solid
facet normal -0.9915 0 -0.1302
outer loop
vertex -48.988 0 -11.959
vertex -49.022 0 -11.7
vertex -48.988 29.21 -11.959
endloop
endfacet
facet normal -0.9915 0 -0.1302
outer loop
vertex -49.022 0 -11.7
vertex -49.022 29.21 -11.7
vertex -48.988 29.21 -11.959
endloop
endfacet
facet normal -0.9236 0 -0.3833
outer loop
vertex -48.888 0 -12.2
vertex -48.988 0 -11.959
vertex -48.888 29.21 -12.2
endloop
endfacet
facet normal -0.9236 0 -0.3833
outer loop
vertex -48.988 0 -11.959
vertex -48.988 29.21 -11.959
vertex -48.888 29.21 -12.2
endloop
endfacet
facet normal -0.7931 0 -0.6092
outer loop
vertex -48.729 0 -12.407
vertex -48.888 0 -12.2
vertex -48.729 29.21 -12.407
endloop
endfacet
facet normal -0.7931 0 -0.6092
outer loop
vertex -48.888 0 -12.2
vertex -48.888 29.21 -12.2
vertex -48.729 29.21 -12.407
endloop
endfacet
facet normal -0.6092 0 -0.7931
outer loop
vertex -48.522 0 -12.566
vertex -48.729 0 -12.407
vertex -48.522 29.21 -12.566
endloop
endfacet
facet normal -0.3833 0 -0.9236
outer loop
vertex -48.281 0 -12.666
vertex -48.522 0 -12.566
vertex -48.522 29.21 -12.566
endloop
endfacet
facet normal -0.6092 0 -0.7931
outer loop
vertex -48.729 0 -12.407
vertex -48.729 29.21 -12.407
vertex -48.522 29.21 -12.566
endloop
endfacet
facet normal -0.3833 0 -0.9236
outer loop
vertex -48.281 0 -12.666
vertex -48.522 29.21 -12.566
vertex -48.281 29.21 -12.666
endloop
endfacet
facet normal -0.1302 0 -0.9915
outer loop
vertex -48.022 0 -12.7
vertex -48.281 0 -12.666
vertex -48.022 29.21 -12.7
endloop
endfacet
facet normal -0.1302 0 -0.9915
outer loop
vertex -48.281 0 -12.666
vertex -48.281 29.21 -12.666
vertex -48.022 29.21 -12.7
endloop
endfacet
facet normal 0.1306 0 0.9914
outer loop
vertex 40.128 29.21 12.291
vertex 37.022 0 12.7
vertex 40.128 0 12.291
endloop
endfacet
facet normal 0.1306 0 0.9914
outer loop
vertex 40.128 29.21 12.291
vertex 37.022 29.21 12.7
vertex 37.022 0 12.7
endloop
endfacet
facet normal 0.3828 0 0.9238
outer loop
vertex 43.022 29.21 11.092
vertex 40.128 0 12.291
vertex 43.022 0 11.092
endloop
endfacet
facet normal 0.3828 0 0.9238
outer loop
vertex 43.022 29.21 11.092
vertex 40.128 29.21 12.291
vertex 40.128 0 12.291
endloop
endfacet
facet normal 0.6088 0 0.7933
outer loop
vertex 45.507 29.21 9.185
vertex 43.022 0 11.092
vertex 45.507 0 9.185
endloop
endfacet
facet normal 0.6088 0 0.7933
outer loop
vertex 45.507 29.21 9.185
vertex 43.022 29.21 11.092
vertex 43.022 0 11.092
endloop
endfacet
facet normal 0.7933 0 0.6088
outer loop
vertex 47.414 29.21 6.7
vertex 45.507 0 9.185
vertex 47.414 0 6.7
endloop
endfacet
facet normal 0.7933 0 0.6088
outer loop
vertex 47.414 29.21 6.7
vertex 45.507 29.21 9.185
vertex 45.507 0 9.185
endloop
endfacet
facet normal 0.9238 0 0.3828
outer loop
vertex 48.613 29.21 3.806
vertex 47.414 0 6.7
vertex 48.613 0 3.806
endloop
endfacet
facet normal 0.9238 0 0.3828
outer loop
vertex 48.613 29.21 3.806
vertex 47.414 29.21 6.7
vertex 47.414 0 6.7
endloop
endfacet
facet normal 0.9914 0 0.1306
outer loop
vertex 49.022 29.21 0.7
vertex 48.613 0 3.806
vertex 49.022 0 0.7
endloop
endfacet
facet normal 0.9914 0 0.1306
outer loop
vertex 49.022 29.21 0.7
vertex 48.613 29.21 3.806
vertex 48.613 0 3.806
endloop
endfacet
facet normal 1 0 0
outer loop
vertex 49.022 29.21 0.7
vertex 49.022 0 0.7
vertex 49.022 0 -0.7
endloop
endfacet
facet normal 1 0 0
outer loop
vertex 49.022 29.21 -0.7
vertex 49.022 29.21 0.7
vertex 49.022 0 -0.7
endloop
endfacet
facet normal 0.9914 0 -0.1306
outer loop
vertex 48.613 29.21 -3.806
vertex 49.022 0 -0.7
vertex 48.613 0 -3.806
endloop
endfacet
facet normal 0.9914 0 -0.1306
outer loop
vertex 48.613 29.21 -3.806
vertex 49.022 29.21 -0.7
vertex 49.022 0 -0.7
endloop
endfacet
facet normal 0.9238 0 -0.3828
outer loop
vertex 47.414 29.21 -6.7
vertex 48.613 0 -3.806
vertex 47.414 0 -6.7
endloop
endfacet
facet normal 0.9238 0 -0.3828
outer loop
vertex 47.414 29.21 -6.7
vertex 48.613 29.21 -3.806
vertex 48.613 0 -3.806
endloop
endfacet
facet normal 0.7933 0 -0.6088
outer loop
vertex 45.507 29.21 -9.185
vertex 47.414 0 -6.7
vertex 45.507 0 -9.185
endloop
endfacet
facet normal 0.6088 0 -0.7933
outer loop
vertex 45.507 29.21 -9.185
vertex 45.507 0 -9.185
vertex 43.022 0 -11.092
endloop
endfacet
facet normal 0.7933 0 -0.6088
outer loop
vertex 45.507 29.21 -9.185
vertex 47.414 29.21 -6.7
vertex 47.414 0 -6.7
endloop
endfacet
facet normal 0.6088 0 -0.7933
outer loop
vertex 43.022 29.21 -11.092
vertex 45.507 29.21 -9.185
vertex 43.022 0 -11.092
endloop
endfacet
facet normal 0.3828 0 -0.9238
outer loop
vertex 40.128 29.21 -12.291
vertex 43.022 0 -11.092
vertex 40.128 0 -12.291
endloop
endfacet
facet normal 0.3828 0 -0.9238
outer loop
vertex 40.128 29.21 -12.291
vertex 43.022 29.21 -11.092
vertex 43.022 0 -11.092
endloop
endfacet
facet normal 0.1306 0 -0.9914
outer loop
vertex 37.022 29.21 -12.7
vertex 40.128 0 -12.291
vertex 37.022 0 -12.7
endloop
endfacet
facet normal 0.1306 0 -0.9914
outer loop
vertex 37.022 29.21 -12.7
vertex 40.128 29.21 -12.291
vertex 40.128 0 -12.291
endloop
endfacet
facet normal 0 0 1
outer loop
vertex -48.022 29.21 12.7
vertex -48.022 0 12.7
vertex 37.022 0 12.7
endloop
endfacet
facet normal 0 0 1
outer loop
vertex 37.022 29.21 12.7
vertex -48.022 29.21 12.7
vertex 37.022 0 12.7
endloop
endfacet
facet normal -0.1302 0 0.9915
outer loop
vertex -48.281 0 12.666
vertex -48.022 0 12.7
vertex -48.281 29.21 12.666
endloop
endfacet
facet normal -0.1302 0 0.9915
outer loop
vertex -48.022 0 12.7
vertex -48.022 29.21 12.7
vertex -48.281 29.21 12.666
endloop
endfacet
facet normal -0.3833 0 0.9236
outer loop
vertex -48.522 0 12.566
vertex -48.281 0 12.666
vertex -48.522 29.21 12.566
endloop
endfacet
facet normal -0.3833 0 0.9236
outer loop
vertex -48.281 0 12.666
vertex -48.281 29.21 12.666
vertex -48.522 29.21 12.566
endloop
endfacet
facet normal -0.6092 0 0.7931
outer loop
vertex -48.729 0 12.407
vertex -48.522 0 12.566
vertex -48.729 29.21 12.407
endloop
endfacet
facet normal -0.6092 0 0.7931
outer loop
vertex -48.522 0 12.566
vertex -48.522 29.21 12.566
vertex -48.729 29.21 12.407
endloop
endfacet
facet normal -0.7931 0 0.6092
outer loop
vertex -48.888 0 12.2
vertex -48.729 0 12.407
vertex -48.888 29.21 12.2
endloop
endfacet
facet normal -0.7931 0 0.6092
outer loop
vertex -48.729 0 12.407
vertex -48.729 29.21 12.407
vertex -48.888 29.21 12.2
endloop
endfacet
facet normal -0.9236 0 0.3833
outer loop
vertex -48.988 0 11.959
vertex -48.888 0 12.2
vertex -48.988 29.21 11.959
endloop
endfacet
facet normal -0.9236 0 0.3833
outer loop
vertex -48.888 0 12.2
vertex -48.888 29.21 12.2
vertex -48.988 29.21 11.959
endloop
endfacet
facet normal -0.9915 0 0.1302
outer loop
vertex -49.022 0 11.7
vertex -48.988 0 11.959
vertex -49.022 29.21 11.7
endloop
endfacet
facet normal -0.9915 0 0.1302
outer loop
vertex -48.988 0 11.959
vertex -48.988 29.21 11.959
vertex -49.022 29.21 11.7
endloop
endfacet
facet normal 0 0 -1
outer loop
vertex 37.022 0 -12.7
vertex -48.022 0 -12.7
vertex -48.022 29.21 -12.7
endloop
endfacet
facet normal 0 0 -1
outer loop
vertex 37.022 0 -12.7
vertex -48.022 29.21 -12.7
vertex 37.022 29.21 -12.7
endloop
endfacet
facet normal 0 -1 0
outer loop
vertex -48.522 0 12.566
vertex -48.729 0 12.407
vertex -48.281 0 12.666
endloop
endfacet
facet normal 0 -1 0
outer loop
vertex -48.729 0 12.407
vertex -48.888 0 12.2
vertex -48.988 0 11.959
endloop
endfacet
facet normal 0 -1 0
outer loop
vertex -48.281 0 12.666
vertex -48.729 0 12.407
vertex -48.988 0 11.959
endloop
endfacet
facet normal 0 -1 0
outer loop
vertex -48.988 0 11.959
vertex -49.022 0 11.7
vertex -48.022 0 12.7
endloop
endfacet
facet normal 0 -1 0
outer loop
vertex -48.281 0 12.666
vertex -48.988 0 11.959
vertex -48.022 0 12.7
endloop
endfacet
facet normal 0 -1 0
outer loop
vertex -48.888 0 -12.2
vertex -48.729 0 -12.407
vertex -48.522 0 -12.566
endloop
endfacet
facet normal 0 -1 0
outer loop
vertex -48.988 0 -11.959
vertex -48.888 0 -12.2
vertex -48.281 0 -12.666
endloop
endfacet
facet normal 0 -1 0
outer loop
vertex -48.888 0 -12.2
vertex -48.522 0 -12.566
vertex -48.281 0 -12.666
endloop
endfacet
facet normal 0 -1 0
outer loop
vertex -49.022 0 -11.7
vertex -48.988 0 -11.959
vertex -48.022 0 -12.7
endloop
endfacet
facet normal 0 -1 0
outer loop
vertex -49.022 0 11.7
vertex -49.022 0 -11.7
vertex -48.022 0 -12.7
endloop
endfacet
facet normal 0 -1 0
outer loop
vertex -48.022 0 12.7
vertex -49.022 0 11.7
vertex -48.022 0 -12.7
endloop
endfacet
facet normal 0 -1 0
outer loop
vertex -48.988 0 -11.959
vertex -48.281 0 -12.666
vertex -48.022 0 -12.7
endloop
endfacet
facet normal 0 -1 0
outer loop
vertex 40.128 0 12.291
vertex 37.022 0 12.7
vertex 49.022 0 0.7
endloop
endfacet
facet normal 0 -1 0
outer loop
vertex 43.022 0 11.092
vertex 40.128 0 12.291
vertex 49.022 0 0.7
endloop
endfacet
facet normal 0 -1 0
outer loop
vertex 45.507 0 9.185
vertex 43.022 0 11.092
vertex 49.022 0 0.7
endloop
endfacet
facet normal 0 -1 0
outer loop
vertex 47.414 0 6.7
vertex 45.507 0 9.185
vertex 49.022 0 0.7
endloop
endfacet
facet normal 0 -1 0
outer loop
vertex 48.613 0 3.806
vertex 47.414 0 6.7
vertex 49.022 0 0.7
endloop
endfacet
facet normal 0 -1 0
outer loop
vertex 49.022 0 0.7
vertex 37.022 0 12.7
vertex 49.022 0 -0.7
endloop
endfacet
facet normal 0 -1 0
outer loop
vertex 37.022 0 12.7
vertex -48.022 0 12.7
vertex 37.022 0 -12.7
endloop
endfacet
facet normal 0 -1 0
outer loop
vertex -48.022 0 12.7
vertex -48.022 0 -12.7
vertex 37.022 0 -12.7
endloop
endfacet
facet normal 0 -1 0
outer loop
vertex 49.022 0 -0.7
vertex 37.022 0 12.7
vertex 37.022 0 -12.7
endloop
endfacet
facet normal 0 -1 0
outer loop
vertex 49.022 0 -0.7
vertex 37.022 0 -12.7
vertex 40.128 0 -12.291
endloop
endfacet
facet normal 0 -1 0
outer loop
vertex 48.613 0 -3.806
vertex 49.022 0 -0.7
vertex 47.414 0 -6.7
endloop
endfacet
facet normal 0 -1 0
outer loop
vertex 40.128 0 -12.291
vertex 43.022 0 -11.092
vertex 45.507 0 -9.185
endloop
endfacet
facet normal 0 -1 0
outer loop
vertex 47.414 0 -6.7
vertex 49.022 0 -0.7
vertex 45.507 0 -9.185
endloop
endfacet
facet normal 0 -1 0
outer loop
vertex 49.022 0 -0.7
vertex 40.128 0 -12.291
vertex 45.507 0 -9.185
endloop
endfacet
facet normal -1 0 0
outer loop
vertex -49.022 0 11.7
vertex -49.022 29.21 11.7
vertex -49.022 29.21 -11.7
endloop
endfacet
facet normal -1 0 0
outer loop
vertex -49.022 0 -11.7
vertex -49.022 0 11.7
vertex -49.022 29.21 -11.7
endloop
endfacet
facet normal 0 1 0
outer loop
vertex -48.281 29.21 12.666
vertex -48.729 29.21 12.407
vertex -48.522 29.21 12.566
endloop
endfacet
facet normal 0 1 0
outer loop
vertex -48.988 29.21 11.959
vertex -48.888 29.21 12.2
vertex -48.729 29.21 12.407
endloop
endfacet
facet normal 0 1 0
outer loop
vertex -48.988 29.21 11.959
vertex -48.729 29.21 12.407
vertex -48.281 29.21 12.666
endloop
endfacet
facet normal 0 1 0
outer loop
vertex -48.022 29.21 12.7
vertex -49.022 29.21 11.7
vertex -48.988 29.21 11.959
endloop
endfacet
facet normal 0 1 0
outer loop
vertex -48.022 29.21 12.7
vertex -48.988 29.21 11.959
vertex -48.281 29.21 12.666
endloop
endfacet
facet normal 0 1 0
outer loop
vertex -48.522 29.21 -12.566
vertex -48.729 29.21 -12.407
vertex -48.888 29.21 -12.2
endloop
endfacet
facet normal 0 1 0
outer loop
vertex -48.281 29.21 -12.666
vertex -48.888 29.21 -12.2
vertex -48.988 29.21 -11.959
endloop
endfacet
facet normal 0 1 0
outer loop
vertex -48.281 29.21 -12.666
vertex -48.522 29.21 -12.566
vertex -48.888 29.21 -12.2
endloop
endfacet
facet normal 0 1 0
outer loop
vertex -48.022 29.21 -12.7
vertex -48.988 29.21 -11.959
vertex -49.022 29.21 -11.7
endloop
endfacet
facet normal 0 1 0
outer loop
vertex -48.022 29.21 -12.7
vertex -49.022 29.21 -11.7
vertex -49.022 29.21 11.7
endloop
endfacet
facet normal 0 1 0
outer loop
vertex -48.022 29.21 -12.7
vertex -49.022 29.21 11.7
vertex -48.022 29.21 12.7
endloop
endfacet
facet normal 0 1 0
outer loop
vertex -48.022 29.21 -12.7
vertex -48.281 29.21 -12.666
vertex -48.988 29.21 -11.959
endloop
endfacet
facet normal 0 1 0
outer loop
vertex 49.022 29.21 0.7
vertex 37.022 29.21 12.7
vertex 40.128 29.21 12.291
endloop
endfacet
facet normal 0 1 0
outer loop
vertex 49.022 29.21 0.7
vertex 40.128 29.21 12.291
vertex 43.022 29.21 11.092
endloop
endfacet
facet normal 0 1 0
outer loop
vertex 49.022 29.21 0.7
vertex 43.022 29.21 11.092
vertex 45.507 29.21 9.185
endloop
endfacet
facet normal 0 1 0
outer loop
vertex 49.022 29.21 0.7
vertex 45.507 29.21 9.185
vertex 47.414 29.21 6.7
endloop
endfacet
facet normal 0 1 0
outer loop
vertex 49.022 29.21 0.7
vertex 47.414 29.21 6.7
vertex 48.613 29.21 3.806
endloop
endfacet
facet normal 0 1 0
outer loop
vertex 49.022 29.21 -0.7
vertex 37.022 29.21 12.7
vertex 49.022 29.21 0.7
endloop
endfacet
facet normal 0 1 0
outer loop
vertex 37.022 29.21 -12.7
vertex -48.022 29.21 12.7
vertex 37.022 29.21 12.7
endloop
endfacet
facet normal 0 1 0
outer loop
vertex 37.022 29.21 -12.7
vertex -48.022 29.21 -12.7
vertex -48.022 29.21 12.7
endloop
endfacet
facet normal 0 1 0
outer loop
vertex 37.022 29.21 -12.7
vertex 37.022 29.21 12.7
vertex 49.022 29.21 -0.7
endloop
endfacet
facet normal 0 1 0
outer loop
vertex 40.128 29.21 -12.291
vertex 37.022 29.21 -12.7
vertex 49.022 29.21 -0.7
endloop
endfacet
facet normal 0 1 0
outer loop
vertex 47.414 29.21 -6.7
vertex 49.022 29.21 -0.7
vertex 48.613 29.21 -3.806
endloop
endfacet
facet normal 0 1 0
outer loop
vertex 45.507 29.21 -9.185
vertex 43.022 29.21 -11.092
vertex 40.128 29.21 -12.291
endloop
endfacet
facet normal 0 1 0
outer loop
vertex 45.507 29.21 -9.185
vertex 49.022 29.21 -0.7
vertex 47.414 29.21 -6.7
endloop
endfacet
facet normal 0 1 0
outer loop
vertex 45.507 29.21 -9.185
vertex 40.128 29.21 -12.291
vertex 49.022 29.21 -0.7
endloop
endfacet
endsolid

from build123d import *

# Parameters (mm, degrees)
SKETCH1_W           = 98.044
SKETCH1_H           = 25.4
BOSS_EXTRUDE1_DEPTH = 29.21
FILLET1_R           = 12
FILLET2_R           = 1


with BuildPart() as part:
    # Sketch1 → Boss-Extrude1 (new body)
    with BuildSketch(Plane(origin=(0, 0, 0), x_dir=(1, 0, 0), z_dir=(0, 1, 0))):
        Rectangle(SKETCH1_W, SKETCH1_H)
    extrude(amount=BOSS_EXTRUDE1_DEPTH)

    # Fillet1
    fillet1_edges = [part.edges().sort_by_distance(p)[0] for p in [
        (49.022, 14.605, 12.7),
        (49.022, 14.605, -12.7),
    ]]
    fillet(fillet1_edges, radius=FILLET1_R)

    # Fillet2
    fillet2_edges = [part.edges().sort_by_distance(p)[0] for p in [
        (-49.022, 14.605, 12.7),
        (-49.022, 14.605, -12.7),
    ]]
    fillet(fillet2_edges, radius=FILLET2_R)


solid = part.part
